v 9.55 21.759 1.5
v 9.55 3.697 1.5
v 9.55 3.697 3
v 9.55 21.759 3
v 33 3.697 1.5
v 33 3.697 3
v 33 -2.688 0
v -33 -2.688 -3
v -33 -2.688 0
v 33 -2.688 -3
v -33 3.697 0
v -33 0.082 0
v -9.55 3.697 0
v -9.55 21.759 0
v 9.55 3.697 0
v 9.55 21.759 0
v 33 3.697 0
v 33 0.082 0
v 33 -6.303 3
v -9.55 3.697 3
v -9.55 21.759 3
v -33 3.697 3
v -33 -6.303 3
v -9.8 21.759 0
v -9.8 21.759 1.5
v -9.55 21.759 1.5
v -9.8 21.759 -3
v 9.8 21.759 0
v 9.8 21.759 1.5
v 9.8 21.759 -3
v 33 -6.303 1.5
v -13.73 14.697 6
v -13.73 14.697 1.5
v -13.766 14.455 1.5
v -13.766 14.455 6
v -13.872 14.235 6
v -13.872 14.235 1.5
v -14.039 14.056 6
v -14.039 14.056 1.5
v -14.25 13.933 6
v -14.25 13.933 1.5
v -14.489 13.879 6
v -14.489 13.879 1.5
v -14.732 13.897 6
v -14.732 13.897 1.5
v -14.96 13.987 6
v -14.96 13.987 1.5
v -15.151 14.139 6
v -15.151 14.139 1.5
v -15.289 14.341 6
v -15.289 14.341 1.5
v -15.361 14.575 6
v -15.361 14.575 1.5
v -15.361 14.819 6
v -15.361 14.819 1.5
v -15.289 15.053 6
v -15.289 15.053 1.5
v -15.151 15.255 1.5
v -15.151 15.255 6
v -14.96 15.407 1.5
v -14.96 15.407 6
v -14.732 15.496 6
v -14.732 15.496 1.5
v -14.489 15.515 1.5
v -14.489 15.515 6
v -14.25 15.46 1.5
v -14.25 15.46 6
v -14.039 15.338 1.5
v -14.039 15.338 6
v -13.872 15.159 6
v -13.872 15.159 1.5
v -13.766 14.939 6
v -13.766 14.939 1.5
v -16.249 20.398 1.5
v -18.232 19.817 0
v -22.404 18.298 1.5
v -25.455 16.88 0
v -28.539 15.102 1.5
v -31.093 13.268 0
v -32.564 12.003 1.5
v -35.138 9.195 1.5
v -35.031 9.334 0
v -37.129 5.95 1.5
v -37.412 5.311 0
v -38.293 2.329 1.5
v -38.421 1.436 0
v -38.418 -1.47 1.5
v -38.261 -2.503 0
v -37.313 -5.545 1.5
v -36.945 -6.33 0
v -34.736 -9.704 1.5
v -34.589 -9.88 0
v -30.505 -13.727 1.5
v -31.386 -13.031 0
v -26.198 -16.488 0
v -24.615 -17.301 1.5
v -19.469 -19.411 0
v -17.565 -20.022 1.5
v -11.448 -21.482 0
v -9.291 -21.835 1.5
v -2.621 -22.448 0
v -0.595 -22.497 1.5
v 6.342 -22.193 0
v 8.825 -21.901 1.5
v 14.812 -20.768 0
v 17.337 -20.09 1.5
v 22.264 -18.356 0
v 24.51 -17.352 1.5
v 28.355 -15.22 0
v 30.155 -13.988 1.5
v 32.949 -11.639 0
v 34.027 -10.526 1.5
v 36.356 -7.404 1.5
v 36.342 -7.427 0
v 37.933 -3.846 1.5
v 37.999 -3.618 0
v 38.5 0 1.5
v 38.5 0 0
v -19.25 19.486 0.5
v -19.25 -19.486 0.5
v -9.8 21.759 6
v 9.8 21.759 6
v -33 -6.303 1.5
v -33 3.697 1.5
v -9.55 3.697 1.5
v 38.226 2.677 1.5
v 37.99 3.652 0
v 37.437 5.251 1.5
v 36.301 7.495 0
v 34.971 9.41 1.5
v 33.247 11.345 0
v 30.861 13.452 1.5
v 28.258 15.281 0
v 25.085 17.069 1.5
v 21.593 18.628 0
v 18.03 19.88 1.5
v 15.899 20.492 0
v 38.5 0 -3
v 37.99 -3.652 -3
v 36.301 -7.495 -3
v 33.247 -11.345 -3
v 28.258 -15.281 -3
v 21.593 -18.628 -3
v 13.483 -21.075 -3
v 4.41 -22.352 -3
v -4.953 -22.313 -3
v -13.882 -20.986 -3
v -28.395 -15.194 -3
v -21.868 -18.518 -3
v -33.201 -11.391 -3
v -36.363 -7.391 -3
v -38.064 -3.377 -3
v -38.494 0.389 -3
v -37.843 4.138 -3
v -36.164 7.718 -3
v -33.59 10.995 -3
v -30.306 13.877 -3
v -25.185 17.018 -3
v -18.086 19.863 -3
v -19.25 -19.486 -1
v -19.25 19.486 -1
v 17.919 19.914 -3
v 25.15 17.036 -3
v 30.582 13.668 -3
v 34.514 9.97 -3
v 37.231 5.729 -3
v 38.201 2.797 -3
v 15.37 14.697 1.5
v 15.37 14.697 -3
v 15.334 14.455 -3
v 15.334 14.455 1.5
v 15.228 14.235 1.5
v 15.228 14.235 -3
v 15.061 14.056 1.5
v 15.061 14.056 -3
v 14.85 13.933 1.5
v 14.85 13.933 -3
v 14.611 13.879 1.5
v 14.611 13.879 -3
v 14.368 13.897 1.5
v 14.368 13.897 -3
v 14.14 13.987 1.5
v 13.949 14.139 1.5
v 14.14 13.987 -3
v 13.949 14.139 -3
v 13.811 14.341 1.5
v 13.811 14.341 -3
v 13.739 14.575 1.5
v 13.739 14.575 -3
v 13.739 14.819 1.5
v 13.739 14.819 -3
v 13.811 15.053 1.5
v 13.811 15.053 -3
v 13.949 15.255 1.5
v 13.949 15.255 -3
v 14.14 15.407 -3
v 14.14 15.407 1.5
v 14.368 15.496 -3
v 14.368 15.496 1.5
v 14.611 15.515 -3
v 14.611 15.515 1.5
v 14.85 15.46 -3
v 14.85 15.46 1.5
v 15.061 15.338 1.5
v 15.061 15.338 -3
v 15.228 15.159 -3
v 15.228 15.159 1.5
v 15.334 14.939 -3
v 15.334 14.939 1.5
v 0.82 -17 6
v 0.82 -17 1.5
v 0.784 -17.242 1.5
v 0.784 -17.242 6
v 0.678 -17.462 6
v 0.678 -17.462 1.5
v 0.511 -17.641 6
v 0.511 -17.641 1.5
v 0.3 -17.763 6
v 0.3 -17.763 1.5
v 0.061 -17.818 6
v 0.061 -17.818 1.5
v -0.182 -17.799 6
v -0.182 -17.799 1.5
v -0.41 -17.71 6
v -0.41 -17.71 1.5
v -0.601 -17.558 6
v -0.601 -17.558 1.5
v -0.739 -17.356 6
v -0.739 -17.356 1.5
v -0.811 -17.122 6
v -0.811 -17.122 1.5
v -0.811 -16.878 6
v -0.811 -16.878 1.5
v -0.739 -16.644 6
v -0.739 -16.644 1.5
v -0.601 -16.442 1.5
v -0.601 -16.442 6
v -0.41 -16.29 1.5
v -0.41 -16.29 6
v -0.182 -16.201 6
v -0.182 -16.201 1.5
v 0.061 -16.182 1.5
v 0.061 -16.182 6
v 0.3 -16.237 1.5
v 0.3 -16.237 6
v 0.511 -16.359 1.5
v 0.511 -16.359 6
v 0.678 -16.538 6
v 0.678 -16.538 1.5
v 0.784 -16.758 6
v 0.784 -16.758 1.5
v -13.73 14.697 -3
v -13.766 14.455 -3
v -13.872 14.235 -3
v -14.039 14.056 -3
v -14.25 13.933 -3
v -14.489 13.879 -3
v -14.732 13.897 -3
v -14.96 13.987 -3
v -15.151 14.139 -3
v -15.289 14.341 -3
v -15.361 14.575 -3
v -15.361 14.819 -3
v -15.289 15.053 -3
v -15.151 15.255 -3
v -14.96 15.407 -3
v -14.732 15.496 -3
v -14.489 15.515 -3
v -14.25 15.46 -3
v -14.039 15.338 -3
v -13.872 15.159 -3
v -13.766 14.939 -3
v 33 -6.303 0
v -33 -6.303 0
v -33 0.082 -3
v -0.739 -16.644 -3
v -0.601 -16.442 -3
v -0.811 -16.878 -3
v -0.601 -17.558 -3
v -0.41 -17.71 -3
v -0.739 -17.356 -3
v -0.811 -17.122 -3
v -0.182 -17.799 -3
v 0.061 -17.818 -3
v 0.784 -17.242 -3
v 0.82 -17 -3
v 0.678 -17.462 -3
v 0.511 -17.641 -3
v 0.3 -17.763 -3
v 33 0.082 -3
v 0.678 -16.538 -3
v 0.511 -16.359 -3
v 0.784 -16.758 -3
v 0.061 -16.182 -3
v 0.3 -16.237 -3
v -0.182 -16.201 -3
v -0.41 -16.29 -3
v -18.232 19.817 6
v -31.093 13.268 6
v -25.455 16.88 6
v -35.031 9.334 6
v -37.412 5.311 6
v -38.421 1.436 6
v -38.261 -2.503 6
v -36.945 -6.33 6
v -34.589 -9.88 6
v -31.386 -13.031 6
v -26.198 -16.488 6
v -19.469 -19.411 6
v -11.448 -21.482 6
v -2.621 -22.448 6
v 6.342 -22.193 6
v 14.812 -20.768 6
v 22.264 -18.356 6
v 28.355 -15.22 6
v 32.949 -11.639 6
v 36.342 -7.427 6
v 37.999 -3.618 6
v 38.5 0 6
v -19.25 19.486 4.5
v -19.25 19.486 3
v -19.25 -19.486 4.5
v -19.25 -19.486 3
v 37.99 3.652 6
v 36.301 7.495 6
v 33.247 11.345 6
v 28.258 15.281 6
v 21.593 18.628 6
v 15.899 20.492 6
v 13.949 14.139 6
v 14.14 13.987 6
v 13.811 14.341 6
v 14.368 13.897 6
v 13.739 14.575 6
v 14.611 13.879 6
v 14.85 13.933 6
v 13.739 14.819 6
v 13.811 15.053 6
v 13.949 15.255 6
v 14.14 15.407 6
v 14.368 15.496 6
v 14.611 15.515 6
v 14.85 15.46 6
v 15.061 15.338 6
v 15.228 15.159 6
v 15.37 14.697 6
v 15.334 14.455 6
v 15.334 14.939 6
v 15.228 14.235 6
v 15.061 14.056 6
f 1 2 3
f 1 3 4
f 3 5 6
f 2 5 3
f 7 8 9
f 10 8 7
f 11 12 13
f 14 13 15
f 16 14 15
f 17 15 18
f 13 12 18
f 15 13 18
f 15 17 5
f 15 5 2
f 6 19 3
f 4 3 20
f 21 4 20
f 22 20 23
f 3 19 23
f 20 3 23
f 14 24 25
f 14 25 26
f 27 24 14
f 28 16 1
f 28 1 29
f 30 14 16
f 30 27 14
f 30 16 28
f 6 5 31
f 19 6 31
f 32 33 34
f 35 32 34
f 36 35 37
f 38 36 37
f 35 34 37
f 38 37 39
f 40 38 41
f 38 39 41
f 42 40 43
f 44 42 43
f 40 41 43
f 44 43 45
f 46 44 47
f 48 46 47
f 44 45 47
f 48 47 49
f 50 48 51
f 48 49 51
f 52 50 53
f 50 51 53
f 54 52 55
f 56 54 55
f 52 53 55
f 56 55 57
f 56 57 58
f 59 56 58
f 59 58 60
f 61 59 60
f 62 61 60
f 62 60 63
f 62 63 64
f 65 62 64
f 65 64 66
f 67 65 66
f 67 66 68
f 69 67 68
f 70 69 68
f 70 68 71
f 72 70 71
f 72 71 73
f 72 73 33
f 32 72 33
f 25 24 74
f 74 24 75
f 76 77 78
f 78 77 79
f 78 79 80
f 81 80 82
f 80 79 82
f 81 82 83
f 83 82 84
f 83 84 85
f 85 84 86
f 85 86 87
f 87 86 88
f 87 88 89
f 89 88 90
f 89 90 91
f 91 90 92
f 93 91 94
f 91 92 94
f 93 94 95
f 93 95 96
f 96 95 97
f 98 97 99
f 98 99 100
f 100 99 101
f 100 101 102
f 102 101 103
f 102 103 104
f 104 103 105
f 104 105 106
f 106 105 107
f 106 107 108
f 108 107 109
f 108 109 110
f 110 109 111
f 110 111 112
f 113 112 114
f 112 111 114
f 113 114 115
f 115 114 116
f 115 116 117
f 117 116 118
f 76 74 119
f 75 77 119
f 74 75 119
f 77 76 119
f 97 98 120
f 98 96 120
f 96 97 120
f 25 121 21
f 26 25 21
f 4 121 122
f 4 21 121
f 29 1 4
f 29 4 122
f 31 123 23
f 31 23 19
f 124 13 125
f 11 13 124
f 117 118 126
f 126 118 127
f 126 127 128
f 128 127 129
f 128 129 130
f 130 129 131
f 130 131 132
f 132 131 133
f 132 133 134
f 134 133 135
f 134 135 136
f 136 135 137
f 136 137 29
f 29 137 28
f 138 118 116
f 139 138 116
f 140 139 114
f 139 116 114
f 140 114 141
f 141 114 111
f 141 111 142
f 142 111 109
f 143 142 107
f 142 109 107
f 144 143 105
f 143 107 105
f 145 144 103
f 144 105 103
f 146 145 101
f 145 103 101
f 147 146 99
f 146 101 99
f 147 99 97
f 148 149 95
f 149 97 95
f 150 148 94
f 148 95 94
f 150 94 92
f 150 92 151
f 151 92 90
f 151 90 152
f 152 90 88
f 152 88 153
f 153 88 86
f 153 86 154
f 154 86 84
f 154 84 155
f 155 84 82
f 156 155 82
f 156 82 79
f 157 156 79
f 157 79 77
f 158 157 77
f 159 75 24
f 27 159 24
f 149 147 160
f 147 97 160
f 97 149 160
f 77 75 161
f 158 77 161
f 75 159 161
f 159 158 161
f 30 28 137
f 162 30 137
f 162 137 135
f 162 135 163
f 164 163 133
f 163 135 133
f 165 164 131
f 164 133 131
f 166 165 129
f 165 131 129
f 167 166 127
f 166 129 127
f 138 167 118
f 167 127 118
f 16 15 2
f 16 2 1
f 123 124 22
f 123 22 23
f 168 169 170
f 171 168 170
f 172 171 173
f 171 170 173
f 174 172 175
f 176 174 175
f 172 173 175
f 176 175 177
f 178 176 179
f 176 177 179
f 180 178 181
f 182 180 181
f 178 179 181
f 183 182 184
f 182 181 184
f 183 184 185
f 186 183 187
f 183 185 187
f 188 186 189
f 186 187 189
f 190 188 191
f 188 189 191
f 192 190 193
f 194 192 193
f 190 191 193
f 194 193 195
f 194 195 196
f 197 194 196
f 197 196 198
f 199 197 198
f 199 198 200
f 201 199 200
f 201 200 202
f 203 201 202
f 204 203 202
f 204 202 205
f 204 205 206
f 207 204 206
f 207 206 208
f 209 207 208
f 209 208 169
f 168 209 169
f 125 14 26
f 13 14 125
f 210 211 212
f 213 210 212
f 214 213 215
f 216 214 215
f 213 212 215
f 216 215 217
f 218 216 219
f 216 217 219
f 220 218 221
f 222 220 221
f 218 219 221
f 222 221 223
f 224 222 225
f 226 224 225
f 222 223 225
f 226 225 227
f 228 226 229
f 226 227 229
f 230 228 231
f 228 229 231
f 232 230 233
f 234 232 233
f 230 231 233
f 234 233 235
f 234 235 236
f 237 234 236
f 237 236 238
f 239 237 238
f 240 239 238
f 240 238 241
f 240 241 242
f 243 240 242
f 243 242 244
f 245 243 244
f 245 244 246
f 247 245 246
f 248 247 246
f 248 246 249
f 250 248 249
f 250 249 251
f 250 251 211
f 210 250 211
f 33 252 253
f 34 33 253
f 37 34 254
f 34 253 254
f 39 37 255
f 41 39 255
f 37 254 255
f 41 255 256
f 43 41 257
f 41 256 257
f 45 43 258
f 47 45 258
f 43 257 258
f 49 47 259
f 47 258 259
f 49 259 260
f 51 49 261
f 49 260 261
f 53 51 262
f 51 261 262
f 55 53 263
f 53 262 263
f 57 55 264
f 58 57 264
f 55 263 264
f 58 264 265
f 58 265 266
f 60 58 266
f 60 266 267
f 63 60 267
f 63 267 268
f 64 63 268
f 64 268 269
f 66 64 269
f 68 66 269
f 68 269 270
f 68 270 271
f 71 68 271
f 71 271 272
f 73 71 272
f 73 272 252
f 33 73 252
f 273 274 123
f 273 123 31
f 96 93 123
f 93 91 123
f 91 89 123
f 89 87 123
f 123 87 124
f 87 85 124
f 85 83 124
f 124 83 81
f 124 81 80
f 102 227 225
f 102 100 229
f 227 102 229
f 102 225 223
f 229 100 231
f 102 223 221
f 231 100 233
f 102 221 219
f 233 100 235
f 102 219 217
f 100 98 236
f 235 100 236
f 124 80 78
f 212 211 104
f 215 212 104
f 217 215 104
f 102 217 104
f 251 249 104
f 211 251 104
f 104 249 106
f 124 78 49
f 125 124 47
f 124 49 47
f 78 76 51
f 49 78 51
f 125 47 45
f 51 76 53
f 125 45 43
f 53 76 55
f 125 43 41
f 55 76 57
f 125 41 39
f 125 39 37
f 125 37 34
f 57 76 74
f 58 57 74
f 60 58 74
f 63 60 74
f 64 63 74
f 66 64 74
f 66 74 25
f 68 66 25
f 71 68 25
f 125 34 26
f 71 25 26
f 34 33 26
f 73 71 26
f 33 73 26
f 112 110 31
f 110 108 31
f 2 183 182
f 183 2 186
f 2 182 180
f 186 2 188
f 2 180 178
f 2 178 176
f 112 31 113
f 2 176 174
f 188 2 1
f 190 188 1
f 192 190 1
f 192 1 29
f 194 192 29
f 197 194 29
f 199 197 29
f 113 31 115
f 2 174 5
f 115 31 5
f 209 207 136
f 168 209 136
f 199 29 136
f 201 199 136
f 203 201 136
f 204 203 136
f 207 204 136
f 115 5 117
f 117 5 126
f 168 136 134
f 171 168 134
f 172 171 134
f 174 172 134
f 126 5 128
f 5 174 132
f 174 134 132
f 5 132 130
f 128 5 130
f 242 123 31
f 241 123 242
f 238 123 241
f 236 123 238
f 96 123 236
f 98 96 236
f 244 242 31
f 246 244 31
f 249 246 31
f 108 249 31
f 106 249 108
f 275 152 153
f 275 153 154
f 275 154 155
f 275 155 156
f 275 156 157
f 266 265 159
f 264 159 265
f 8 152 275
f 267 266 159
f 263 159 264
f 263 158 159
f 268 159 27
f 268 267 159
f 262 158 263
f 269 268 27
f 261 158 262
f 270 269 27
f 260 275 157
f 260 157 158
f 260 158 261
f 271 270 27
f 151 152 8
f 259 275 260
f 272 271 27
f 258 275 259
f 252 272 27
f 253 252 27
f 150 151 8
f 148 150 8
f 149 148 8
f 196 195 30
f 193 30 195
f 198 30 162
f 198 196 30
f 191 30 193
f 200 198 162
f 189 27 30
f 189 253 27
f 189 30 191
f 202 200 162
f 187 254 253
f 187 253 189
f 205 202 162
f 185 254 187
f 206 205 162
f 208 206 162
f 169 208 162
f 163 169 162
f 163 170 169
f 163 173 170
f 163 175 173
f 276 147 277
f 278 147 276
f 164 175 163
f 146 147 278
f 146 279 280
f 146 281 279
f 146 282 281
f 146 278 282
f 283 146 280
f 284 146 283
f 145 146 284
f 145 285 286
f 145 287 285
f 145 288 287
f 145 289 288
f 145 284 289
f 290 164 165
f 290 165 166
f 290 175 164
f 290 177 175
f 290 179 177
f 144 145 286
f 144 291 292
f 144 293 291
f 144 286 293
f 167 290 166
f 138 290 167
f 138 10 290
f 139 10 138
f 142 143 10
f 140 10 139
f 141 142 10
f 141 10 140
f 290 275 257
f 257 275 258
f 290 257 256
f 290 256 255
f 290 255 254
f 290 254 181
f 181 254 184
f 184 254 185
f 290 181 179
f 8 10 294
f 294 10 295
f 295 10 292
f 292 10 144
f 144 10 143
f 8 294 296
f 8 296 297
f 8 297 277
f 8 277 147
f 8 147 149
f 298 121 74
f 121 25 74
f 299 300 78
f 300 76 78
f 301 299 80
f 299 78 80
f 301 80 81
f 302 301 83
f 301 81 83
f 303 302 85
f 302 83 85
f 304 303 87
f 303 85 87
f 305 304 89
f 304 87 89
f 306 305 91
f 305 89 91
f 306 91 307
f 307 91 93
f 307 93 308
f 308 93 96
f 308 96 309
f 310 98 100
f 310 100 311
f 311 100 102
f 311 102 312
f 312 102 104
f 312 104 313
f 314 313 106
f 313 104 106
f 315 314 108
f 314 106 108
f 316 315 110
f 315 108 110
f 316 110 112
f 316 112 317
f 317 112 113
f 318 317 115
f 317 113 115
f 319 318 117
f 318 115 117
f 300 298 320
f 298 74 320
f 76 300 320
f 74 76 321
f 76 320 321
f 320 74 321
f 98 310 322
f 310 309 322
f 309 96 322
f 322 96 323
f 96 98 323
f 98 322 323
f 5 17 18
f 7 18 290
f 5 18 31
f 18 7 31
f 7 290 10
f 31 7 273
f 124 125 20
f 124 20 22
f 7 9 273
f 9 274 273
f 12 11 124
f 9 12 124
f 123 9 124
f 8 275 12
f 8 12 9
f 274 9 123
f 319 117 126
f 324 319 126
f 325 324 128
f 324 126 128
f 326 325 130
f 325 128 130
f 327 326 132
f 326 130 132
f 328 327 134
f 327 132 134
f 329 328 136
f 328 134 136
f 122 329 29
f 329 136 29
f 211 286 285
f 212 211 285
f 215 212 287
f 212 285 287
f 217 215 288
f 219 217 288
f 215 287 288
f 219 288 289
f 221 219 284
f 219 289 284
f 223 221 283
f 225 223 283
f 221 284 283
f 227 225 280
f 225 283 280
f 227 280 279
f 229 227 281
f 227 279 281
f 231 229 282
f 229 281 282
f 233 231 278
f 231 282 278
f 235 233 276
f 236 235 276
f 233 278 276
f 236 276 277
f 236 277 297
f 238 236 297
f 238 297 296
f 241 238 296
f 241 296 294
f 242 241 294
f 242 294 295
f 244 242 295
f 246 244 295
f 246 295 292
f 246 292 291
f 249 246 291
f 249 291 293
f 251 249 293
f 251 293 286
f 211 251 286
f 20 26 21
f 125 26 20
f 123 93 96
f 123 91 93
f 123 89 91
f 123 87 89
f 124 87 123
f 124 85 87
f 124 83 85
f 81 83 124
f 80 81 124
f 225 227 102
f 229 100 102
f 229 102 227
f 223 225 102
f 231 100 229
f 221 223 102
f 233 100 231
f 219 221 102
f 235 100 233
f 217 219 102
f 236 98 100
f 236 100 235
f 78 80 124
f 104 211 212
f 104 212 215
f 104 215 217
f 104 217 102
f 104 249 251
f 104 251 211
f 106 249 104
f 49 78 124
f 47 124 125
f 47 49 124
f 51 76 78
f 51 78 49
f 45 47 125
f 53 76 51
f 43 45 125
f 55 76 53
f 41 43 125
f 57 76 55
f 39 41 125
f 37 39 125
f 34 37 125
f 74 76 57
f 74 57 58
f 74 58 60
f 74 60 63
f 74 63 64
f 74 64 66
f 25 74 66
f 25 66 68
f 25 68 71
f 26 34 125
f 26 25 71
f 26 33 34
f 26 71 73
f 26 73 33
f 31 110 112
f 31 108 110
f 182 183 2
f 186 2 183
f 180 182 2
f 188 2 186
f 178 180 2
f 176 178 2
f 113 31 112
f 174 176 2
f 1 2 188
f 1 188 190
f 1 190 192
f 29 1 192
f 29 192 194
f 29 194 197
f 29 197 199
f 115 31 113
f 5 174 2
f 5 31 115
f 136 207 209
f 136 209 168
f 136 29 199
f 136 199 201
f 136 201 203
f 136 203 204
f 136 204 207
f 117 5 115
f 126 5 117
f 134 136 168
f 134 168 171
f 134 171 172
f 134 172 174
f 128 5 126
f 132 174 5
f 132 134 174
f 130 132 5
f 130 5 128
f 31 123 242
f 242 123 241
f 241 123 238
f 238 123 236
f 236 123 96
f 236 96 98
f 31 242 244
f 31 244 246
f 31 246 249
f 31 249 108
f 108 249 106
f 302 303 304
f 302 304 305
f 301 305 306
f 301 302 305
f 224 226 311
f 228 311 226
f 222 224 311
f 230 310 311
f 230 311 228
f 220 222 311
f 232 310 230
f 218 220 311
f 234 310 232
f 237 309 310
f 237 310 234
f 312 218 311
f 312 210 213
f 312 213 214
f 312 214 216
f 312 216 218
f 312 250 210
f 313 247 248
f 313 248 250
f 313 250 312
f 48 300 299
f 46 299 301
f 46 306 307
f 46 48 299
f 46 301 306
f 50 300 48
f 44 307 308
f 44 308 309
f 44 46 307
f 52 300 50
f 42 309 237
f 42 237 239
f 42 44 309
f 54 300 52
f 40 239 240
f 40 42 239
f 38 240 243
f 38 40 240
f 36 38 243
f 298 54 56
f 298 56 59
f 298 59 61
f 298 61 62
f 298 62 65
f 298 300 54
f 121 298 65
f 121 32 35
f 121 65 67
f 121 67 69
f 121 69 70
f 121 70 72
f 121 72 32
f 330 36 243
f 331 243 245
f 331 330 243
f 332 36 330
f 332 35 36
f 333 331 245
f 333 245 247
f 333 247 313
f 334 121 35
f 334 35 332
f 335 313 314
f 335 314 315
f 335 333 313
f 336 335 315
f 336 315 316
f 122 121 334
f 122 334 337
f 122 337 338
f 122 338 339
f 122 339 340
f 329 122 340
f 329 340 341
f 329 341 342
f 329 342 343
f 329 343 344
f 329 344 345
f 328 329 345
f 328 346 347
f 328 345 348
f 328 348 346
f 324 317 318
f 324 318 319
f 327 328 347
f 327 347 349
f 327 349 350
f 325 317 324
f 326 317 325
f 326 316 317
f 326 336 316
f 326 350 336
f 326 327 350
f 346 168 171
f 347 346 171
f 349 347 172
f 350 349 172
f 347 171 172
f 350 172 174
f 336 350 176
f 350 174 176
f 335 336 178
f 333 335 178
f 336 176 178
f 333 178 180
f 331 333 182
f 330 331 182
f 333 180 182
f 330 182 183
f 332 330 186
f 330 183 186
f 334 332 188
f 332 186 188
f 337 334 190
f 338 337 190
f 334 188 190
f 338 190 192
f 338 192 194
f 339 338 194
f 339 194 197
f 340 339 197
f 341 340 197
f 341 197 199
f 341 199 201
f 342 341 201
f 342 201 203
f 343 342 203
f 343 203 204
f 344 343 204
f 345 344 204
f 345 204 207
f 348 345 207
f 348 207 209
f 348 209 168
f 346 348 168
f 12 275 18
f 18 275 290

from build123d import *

# Parameters (mm, degrees)
BOX_BOTTOM_HALF_0_W     = 78.999568
BOX_BOTTOM_HALF_0_H     = 46.255487
BOX_BOTTOM_HALF_0_DEPTH = 5.5
PAD_DEPTH               = 6
POCKET_DEPTH            = 3
PAD001_DEPTH            = 3
SKETCH003_W             = 66
SKETCH003_H             = 2.77
POCKET001_DEPTH         = 3
SKETCH004_W             = 19.6
SKETCH004_H             = 1
POCKET002_DEPTH         = 9.001
SKETCH005_R             = 0.82
POCKET003_DEPTH         = 9.001


with BuildPart() as box_bottom_half_0_body:
    # box_bottom_half_0 → box_bottom_half_0 (new body)
    with BuildSketch(Plane(origin=(-39.499568, -23.496619, -4), x_dir=(1, 0, 0), z_dir=(0, 0, 1))):
        with Locations((39.499784, 23.127743)):
            Rectangle(BOX_BOTTOM_HALF_0_W, BOX_BOTTOM_HALF_0_H)
    extrude(amount=BOX_BOTTOM_HALF_0_DEPTH)


with BuildPart() as body:
    # Sketch → Pad (new body)
    with BuildSketch(Plane.XY):
        with BuildLine():
            add(Edge.make_bspline(
                [(38.5, 0), (38.5, 38.971143), (-19.25, 19.485572), (-77, 0), (-19.25, -19.485572), (38.5, -38.971143), (38.5, 0)],
                knots=[0, 0, 0, 2.094395, 2.094395, 4.18879, 4.18879, 6.283185, 6.283185, 6.283185], degree=2, weights=[1, 0.5, 1, 0.5, 1, 0.5, 1]))
        make_face()
    extrude(amount=PAD_DEPTH)

    # Sketch001 (on Face2 of Pad) → Pocket (cut)
    with BuildSketch(Plane(origin=(0, 0, 0), x_dir=(1, 0, 0), z_dir=(0, 0, -1))):
        Polygon((9.55, -3.696801), (9.55, -21.796801), (-9.55, -21.796801), (-9.55, -3.696801), (-33, -3.696801), (-33, 6.303199), (33, 6.303199), (33, -3.696801), align=None)
    extrude(amount=-POCKET_DEPTH, mode=Mode.SUBTRACT)

    # Sketch002 (on Face2 of Pocket) → Pad001 (join)
    with BuildSketch(Plane(origin=(0, 0, 0), x_dir=(1, 0, 0), z_dir=(0, 0, -1))):
        with BuildLine():
            add(Edge.make_bspline(
                [(38.5, 0), (38.5, 38.971143), (-19.25, 19.485572), (-77, 0), (-19.25, -19.485572), (38.5, -38.971143), (38.5, 0)],
                knots=[0, 0, 0, 2.094395, 2.094395, 4.18879, 4.18879, 6.283185, 6.283185, 6.283185], degree=2, weights=[1, 0.5, 1, 0.5, 1, 0.5, 1]))
        make_face()
    extrude(amount=PAD001_DEPTH)

    # Sketch003 (on Face4 of Pad001) → Pocket001 (cut)
    with BuildSketch(Plane(origin=(0, 0, -3), x_dir=(1, 0, 0), z_dir=(0, 0, -1))):
        with Locations((0, 1.303199)):
            Rectangle(SKETCH003_W, SKETCH003_H)
    extrude(amount=-POCKET001_DEPTH, mode=Mode.SUBTRACT)

    # Sketch004 (on Face4 of Pocket001) → Pocket002 (cut, through all)
    with BuildSketch(Plane(origin=(0, 0, -3), x_dir=(1, 0, 0), z_dir=(0, 0, -1))):
        with Locations((0, -22.258868)):
            Rectangle(SKETCH004_W, SKETCH004_H)
    extrude(amount=-POCKET002_DEPTH, mode=Mode.SUBTRACT)

    # Sketch005 (on Face7 of Pocket002) → Pocket003 (cut, through all)
    with BuildSketch(Plane(origin=(0, 0, -3), x_dir=(1, 0, 0), z_dir=(0, 0, -1))):
        with Locations((-14.55, -14.696801)):
            Circle(SKETCH005_R)
        with Locations((0, 17)):
            Circle(SKETCH005_R)
        with Locations((14.55, -14.696801)):
            Circle(SKETCH005_R)
    extrude(amount=-POCKET003_DEPTH, mode=Mode.SUBTRACT)


with BuildPart() as bottom_half_0_body:
    # bottom_half_0 base: copy of Body
    add(body.part)

    # bottom_half_0: intersect box_bottom_half_0 body
    add(box_bottom_half_0_body.part, mode=Mode.INTERSECT)


with BuildPart() as top_half_0_body:
    # top_half_0 base: copy of Body
    add(body.part)

    # top_half_0: cut box_bottom_half_0 body
    add(box_bottom_half_0_body.part, mode=Mode.SUBTRACT)


solid = Compound([bottom_half_0_body.part, top_half_0_body.part])
